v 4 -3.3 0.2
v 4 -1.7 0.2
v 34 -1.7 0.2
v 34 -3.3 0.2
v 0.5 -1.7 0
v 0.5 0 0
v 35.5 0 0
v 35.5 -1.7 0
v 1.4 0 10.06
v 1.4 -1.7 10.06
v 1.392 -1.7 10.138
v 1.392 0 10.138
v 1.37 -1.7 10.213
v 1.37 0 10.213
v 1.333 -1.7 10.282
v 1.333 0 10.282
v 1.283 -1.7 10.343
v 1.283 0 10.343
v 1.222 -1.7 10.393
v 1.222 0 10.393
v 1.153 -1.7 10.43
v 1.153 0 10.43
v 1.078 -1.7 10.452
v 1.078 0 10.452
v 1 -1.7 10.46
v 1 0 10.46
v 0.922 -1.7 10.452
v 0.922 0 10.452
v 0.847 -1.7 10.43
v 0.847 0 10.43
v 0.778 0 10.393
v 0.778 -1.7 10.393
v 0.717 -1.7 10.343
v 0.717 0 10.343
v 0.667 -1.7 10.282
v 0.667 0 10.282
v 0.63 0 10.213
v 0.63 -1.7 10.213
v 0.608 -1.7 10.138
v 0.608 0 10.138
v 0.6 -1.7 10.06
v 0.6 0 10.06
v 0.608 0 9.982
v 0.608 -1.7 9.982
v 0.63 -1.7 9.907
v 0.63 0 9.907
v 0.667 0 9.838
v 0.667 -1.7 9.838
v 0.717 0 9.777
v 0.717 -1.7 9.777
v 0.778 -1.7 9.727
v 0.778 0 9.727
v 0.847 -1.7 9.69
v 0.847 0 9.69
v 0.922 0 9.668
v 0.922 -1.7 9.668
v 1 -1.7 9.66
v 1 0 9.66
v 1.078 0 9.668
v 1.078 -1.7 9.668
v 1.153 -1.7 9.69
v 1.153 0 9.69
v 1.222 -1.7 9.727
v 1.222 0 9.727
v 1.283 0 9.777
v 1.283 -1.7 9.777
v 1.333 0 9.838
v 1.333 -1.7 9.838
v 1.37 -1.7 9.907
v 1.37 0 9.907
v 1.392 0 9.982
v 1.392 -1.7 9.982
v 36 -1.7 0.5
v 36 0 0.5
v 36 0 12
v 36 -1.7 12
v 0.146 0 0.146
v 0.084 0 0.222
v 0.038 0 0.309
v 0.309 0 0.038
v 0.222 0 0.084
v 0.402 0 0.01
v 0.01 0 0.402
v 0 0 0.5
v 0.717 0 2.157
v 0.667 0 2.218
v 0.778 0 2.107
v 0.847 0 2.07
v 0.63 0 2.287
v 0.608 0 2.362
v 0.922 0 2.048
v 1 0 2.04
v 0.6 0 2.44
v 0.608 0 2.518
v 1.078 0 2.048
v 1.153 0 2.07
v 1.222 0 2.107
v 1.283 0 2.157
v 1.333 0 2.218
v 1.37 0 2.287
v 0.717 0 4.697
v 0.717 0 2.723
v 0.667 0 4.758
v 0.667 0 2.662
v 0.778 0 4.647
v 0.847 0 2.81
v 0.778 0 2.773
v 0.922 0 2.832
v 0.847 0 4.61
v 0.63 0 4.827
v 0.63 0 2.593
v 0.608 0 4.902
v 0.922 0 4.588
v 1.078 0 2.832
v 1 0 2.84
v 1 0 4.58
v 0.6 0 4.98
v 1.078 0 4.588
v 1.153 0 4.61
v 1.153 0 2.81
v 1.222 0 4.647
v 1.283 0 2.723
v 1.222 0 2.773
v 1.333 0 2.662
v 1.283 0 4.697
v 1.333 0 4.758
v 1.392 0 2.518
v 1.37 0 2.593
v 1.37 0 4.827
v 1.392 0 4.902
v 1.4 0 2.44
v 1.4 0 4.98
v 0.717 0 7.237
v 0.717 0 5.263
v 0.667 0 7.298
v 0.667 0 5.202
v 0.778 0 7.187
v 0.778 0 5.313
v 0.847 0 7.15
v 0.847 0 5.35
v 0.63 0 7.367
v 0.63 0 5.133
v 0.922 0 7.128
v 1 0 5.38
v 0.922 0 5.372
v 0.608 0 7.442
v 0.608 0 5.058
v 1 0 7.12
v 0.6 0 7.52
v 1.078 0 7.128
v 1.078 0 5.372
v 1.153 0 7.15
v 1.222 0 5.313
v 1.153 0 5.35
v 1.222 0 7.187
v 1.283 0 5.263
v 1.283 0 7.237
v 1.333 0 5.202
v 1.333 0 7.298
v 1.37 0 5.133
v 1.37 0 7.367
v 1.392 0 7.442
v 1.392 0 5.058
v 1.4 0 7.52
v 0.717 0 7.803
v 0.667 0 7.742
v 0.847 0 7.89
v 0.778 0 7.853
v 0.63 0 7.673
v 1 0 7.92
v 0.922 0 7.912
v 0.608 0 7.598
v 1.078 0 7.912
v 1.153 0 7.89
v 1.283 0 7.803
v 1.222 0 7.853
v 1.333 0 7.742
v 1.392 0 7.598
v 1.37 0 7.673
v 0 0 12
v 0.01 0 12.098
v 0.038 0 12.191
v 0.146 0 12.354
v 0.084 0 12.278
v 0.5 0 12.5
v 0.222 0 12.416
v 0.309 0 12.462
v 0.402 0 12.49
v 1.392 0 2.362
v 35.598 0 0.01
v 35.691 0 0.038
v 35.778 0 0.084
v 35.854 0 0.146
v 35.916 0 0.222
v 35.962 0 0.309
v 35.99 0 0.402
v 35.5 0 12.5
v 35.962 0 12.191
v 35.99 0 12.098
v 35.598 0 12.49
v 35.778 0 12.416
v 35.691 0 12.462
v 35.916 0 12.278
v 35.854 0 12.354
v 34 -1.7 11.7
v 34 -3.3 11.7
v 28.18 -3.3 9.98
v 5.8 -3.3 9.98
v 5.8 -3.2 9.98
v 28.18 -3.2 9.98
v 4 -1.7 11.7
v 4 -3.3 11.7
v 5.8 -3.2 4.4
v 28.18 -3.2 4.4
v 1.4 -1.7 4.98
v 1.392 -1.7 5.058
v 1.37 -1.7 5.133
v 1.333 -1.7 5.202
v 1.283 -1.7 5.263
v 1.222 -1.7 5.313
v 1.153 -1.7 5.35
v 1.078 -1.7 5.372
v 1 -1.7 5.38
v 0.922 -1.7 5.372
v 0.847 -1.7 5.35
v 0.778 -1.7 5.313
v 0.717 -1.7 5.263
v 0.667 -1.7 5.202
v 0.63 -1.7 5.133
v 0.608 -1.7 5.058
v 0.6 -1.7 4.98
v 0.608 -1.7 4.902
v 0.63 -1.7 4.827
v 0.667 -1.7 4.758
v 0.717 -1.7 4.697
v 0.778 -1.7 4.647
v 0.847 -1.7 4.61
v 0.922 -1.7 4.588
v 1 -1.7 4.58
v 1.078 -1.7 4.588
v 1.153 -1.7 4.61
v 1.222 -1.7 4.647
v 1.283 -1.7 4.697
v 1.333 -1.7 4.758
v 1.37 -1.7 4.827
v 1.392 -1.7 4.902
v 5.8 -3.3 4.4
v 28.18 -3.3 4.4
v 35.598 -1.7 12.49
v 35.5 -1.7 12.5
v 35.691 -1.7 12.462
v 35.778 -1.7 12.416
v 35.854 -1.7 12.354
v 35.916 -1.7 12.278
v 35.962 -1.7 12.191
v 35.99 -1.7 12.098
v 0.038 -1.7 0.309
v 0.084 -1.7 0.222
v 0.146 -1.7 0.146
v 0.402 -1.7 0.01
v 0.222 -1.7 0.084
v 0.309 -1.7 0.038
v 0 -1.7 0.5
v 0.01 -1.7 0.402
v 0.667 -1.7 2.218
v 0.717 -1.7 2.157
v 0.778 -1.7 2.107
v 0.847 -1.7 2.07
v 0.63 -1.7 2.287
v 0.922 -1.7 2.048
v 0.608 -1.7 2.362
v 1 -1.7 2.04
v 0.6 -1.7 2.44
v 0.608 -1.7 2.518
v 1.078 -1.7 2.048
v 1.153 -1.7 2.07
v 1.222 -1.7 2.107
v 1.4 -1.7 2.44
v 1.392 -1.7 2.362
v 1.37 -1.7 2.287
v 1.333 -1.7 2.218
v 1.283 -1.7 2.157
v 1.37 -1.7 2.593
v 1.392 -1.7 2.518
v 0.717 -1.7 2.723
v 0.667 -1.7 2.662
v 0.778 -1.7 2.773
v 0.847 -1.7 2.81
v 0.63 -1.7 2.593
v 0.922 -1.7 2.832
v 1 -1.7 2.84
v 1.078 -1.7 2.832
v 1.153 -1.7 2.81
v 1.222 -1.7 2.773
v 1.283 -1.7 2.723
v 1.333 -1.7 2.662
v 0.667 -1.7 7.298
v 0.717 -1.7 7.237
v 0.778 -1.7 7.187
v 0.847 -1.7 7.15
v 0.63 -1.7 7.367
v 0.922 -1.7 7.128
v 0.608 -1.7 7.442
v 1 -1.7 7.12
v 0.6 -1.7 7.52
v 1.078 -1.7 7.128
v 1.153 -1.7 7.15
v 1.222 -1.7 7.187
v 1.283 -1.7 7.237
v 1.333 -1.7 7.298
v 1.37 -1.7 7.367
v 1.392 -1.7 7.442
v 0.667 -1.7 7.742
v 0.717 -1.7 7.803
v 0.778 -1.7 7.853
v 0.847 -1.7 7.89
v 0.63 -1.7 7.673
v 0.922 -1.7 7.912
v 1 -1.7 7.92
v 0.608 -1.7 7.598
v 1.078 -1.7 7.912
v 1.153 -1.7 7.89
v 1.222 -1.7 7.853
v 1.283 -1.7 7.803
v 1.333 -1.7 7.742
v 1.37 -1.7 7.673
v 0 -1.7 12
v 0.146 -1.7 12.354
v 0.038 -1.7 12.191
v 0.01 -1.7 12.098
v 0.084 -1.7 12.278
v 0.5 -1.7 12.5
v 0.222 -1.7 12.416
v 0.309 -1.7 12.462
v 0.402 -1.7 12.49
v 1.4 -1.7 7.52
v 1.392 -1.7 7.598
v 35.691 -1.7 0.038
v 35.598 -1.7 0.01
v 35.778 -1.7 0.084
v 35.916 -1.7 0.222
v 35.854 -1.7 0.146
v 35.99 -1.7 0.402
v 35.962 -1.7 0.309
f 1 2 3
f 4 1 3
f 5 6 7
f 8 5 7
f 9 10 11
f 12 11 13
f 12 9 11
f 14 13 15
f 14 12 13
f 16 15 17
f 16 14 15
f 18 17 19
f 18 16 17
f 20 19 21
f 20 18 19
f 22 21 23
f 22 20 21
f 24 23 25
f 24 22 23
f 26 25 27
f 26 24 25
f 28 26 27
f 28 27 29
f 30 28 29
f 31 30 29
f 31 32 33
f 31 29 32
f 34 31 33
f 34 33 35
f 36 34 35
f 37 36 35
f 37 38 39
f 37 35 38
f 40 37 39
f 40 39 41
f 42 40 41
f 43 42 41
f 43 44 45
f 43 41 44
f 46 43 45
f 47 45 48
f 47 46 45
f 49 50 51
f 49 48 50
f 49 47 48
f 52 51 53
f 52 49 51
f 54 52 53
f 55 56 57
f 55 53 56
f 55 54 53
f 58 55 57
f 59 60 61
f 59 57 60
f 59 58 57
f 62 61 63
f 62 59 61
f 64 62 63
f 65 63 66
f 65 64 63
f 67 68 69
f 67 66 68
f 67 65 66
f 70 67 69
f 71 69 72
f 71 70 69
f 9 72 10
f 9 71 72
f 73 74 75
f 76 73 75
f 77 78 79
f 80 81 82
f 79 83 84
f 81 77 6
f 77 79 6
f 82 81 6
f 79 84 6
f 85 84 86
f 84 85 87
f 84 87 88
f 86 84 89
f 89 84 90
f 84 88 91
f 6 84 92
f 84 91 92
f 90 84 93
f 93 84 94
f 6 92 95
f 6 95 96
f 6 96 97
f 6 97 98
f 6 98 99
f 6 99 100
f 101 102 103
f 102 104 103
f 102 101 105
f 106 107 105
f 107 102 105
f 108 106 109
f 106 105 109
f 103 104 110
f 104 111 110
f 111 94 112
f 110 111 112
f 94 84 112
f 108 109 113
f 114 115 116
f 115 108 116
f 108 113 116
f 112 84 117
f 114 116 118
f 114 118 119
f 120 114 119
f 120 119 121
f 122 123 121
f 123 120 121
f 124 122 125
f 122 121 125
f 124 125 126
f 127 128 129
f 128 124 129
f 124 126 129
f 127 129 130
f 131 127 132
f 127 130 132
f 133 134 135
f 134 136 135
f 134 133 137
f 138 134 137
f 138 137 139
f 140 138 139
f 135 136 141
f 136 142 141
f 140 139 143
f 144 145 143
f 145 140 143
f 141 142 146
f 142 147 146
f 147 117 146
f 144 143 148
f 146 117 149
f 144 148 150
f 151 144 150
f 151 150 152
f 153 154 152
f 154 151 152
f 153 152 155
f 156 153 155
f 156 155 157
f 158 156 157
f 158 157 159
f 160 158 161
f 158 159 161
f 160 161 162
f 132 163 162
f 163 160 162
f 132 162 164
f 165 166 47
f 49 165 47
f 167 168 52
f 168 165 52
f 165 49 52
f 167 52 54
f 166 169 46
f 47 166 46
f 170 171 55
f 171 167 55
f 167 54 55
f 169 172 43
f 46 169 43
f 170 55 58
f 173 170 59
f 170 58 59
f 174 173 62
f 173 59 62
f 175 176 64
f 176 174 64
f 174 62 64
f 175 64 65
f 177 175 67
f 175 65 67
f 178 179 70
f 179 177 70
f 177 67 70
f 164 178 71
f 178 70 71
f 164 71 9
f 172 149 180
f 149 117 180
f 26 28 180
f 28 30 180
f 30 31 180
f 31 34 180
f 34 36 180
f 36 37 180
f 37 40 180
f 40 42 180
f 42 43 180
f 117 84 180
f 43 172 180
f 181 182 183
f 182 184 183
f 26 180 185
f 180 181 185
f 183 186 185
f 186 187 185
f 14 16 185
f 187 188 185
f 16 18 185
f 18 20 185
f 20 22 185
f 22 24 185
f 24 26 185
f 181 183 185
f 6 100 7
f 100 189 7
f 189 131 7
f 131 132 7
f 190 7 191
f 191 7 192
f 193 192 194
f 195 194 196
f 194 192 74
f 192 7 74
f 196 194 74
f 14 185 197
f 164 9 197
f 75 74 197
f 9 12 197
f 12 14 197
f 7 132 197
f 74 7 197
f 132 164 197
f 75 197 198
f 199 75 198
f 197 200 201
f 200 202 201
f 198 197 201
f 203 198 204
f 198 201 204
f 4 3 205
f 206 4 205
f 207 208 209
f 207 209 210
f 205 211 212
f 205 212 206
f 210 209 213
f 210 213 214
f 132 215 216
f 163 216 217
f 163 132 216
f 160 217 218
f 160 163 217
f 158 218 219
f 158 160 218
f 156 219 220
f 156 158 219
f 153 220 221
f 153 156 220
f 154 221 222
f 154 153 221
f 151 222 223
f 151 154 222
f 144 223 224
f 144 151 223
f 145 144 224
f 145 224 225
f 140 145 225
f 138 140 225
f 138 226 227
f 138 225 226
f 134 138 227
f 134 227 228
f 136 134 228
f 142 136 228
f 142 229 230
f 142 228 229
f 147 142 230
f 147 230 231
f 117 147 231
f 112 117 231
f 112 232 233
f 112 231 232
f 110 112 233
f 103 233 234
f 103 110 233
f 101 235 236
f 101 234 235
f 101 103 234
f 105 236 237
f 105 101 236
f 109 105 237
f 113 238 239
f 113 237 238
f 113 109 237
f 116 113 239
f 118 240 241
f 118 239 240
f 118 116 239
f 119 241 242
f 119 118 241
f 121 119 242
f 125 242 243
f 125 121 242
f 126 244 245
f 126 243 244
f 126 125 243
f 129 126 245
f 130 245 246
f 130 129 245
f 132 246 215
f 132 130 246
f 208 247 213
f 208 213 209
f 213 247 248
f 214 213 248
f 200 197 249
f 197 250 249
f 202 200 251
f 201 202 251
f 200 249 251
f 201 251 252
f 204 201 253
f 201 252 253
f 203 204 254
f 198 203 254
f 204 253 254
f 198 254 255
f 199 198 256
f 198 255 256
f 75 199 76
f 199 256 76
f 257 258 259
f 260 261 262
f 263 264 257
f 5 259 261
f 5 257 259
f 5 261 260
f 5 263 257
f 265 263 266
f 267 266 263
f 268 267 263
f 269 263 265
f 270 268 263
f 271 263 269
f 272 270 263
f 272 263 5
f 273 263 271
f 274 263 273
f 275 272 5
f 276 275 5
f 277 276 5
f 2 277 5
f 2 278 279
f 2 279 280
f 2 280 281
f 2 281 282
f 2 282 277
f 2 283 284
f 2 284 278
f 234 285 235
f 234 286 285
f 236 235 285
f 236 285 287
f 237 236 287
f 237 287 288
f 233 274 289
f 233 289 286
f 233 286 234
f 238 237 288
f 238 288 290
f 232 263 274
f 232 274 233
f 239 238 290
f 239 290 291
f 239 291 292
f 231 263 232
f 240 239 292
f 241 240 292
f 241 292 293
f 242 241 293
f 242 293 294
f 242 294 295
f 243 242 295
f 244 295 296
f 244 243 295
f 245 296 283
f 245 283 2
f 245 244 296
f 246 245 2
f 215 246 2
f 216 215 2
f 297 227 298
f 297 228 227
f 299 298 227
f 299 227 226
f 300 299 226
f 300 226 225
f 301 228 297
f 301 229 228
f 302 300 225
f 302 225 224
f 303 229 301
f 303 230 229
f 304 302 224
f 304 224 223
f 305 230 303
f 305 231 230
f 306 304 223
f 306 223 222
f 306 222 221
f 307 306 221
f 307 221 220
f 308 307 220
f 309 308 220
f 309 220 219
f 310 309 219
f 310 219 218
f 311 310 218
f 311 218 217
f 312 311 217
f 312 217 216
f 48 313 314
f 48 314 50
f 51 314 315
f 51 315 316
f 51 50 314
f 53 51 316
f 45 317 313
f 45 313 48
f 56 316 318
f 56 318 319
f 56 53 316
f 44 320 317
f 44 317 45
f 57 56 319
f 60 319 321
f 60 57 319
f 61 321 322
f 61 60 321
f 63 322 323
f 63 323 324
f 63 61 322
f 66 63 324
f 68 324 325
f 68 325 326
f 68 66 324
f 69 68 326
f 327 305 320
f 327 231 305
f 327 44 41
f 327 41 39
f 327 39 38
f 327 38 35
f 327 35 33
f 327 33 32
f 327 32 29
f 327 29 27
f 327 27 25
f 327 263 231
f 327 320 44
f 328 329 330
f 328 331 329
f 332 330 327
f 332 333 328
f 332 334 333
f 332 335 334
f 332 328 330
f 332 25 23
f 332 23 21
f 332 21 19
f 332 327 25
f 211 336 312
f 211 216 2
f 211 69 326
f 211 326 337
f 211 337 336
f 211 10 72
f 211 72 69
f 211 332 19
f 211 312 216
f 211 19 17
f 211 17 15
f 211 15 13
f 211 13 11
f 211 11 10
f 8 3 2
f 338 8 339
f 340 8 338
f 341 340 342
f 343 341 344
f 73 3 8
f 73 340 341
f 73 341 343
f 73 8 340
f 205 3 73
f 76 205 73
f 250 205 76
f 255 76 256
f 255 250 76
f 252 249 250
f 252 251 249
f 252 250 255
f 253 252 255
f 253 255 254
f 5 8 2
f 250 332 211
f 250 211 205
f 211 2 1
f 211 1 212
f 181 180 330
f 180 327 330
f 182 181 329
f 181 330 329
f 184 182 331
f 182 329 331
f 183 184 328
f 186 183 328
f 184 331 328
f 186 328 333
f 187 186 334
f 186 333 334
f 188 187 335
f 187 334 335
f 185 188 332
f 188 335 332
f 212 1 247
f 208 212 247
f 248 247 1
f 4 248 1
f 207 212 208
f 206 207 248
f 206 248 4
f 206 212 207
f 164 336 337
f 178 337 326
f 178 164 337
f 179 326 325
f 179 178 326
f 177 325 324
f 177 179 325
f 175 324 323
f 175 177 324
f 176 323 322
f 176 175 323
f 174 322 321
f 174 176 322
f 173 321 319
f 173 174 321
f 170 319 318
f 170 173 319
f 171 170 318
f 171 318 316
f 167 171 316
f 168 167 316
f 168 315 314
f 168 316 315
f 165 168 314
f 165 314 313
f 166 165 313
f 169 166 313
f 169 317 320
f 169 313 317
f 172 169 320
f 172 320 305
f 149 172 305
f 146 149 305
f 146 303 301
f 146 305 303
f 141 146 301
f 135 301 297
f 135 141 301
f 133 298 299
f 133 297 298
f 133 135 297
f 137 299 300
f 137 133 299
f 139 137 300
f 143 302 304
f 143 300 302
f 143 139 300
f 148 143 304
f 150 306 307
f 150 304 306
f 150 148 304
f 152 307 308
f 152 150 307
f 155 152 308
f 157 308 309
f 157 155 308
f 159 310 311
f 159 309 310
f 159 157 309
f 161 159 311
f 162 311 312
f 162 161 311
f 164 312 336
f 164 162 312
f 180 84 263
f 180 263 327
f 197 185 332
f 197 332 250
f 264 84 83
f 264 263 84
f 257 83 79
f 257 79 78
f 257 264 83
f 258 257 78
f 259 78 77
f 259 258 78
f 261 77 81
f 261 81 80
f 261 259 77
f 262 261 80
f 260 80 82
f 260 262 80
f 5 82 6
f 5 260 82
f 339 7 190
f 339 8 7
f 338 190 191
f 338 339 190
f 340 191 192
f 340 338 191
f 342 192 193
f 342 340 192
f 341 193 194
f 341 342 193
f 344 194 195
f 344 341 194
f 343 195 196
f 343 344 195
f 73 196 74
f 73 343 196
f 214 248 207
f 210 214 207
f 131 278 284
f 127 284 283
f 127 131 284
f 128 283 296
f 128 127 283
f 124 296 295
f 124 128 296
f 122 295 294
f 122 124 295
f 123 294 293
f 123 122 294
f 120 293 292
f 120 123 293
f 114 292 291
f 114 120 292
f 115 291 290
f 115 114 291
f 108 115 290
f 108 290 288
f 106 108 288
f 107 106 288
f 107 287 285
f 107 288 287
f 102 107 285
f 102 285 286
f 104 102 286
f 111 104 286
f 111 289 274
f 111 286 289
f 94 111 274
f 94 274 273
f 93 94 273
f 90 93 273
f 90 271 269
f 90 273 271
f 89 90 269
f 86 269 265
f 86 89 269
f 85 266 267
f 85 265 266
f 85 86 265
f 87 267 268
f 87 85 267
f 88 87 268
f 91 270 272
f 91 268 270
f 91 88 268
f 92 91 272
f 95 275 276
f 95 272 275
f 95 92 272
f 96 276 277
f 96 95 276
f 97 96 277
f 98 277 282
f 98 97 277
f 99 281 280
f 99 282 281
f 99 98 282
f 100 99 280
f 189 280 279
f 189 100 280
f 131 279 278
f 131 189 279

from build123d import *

# Parameters (mm, degrees)
SKETCH_W            = 36
SKETCH_H            = 12.5
PAD_DEPTH           = 1.7
SKETCH001_W         = 30
SKETCH001_H         = 11.5
PAD001_DEPTH        = 3.3
SKETCH002_W         = 22.38
SKETCH002_H         = 5.58
POCKET003_DEPTH     = 0.1
SKETCH003_R         = 0.4
HOLE_DEPTH          = 25
LINEARPATTERN_COUNT = 4
LINEARPATTERN_PITCH = 2.54
FILLET_R            = 0.5


with BuildPart() as part:
    # Sketch → Pad (new body)
    with BuildSketch(Plane.XZ):
        with Locations((18, 6.25)):
            Rectangle(SKETCH_W, SKETCH_H)
    extrude(amount=PAD_DEPTH)

    # Sketch001 → Pad001 (join)
    with BuildSketch(Plane.XZ):
        with Locations((19, 5.95)):
            Rectangle(SKETCH001_W, SKETCH001_H)
    extrude(amount=PAD001_DEPTH)

    # Sketch002 (on Face10 of Pad001) → Pocket003 (cut)
    with BuildSketch(Plane.XZ.offset(3.3)):
        with Locations((16.99, 7.19)):
            Rectangle(SKETCH002_W, SKETCH002_H)
    extrude(amount=-POCKET003_DEPTH, mode=Mode.SUBTRACT)

    # Sketch003 → Hole (cut)
    with BuildSketch(Plane.XZ):
        with Locations((1, 2.44)):
            Circle(SKETCH003_R)
    hole = extrude(amount=HOLE_DEPTH, mode=Mode.SUBTRACT)

    # LinearPattern: Hole ×4
    with Locations(*[(0, 0, i * LINEARPATTERN_PITCH) for i in range(1, LINEARPATTERN_COUNT)]):
        add(hole, mode=Mode.SUBTRACT)

    # Fillet
    fillet_edges = [part.edges().sort_by_distance(p)[0] for p in [
        (36, -0.85, 12.5),
        (36, -0.85, 0),
        (0, -0.85, 12.5),
        (0, -0.85, 0),
    ]]
    fillet(fillet_edges, radius=FILLET_R)


solid = part.part
